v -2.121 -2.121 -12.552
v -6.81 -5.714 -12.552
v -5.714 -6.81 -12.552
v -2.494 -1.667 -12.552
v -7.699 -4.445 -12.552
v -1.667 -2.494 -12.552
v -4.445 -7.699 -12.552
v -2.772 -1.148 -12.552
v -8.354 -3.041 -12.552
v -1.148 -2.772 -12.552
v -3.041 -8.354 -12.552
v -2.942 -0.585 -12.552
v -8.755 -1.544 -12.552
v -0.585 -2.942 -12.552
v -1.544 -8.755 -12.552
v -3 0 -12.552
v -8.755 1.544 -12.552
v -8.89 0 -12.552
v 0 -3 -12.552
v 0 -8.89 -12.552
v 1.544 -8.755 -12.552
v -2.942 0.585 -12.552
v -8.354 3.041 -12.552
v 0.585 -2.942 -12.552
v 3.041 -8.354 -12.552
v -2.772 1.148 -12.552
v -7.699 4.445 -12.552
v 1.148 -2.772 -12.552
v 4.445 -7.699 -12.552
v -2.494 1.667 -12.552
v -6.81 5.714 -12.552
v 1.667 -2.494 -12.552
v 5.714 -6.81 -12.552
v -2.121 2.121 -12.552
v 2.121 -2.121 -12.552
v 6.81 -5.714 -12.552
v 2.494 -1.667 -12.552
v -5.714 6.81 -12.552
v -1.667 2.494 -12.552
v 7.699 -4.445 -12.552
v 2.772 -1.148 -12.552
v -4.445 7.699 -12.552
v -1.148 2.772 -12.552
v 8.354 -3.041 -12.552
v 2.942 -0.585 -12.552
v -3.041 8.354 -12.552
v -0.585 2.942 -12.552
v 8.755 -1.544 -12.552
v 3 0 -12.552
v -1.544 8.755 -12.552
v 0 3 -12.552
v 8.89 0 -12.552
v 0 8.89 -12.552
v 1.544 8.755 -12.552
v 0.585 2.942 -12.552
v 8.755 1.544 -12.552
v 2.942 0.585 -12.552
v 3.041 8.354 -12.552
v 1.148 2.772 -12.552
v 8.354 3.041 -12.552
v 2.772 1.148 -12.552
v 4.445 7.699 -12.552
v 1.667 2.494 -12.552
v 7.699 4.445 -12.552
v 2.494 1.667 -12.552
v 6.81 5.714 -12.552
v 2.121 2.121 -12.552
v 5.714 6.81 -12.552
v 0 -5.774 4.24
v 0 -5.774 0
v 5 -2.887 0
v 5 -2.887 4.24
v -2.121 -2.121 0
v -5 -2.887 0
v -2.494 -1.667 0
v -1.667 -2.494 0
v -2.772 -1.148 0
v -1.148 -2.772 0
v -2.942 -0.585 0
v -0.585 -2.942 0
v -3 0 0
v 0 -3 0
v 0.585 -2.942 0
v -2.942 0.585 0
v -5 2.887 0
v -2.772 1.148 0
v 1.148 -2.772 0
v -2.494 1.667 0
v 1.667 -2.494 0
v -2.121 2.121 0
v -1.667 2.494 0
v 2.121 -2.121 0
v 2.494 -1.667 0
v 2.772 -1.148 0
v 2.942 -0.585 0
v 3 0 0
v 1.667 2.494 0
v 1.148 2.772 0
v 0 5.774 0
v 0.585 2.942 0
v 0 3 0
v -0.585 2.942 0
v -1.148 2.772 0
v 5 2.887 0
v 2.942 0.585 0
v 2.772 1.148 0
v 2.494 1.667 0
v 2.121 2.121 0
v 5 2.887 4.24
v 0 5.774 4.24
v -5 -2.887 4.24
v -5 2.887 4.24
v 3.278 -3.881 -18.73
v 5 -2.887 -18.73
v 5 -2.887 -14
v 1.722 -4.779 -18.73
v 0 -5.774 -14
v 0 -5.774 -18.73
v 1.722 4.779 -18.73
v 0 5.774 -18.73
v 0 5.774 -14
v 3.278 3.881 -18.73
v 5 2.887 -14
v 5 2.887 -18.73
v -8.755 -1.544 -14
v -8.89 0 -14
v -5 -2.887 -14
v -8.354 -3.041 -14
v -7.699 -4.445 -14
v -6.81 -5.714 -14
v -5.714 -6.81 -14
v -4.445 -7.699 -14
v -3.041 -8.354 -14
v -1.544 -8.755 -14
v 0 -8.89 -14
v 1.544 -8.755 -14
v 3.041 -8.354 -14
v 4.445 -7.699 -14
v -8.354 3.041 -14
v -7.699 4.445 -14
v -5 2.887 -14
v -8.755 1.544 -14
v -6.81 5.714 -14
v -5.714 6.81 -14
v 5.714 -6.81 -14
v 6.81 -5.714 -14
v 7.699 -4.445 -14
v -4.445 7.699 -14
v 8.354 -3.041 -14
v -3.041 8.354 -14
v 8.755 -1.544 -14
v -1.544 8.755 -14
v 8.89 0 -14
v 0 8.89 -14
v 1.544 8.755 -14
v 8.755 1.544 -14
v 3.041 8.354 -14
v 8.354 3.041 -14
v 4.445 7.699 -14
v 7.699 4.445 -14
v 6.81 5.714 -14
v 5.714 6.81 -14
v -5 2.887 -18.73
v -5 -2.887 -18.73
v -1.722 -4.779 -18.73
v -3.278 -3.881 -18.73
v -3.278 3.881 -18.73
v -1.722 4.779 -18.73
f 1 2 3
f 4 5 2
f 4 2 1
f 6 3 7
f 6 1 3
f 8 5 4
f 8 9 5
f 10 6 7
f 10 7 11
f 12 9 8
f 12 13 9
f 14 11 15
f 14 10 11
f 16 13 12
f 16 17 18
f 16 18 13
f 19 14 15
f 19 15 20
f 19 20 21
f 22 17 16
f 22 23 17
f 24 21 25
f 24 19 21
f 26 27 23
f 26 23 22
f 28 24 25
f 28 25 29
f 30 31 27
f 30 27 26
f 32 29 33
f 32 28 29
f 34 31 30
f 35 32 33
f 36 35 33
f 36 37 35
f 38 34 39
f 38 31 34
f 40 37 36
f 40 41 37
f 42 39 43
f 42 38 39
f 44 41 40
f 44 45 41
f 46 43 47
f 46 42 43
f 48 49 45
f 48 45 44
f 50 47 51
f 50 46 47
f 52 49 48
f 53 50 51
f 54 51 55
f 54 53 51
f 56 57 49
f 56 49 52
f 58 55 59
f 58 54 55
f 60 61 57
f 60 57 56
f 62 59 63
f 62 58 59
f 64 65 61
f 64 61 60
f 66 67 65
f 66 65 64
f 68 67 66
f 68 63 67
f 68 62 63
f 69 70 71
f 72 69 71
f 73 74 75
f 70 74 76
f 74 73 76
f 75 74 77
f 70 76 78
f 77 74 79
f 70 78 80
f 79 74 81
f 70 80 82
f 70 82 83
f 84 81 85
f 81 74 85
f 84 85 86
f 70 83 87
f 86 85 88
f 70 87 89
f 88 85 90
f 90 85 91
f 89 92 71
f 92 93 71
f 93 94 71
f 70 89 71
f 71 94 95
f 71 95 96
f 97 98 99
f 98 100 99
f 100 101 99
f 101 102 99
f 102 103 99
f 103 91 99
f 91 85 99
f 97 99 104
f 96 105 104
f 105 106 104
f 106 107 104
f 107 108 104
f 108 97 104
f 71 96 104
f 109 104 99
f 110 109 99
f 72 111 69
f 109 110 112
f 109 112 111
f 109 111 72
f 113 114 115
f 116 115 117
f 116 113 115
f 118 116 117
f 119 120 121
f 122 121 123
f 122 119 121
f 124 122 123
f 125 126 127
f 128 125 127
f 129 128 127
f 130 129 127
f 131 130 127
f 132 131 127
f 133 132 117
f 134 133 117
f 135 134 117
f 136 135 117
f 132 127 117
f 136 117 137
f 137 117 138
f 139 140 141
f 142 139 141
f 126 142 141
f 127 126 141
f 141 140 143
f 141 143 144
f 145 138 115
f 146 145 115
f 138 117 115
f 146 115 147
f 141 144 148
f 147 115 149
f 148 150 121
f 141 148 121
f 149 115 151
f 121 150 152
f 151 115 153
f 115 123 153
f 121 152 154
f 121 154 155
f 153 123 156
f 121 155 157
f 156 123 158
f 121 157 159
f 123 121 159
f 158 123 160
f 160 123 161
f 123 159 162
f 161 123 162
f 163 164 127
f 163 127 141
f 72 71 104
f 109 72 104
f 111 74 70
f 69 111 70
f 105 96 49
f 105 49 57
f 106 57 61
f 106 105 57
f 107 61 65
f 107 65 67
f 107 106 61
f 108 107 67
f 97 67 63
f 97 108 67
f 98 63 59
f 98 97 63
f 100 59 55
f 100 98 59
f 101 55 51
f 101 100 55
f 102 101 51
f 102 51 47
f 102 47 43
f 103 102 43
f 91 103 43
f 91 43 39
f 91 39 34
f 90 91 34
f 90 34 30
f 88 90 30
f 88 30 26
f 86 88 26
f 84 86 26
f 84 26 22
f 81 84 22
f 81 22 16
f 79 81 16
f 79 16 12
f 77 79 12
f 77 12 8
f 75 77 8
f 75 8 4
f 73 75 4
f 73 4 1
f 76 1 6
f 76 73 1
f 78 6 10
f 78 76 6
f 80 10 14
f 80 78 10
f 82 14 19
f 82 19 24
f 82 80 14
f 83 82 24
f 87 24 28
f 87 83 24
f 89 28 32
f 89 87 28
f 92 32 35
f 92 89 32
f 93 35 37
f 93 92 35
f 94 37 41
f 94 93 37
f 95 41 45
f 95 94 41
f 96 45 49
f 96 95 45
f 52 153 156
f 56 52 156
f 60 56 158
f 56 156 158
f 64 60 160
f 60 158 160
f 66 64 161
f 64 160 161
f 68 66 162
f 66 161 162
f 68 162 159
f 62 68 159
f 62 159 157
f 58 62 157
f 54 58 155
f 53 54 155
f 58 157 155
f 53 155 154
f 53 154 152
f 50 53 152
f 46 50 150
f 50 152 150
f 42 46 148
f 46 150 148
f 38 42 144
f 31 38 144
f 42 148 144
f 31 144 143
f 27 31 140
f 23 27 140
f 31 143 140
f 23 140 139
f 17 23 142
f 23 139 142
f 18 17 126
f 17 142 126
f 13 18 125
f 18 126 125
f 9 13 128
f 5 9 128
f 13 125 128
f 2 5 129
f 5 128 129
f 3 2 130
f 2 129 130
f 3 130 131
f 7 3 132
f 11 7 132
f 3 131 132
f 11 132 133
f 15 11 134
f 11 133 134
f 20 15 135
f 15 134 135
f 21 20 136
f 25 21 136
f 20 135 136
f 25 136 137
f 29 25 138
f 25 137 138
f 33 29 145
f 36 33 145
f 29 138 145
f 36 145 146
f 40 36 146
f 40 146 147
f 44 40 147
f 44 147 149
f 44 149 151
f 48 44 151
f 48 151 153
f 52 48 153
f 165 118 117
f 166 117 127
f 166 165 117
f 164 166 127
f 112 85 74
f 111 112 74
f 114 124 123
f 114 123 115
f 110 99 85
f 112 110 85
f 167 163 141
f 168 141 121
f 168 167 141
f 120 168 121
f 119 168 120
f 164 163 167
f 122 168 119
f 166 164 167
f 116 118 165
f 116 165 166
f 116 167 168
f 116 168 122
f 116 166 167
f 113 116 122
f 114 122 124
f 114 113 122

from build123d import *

# Parameters (mm, degrees)
F0_R     = 3
F1_DEPTH = 20
F3_DEPTH = 4.24
F5_DEPTH = 6
F6_R     = 8.89
F7_DEPTH = 1.4478
F9_DEPTH = 1.27


with BuildPart() as f1:
    # F0 (on Top) → F1 (new body)
    with BuildSketch(Plane.XY):
        Circle(F0_R)
    extrude(amount=-F1_DEPTH)

    # F2 (on face) → F3 (join)
    with BuildSketch(Plane.XY):
        Polygon((5, 2.8867513459), (0, 5.7735026919), (-5, 2.8867513459), (-5, -2.8867513459), (0, -5.7735026919), (5, -2.8867513459), align=None)
    extrude(amount=F3_DEPTH)

    # F4 (on face) → F5 (join)
    with BuildSketch(Plane(origin=(0, 0, -20), x_dir=(1, 0, 0), z_dir=(0, 0, -1))):
        Polygon((5, 2.8867513459), (0, 5.7735026919), (-5, 2.8867513459), (-5, -2.8867513459), (0, -5.7735026919), (5, -2.8867513459), align=None)
    extrude(amount=-F5_DEPTH)

    # F6 (on face) → F7 (join)
    with BuildSketch(Plane.XY.offset(-14)):
        Circle(F6_R)
    extrude(amount=F7_DEPTH)

    # F8 (on face) → F9 (cut)
    with BuildSketch(Plane(origin=(0, 0, -20), x_dir=(1, 0, 0), z_dir=(0, 0, -1))):
        with BuildLine():
            ThreePointArc((5, -0.8979977728), (5.0599604742, -0.4507771068), (5.08, 0))
            ThreePointArc((5.08, 0), (5.0599604742, 0.4507771068), (5, 0.8979977728))
            Line((5, 0.8979977728), (5, -0.8979977728))
        make_face()
        with BuildLine():
            Line((5, -0.8979977728), (5, 0.8979977728))
            ThreePointArc((5, 0.8979977728), (4.3994090512, 2.54), (3.2776888838, 3.8811281325))
            Line((3.2776888838, 3.8811281325), (1.7223111162, 4.7791259053))
            ThreePointArc((1.7223111162, 4.7791259053), (0, 5.08), (-1.7223111162, 4.7791259053))
            Line((-1.7223111162, 4.7791259053), (-3.2776888838, 3.8811281325))
            ThreePointArc((-3.2776888838, 3.8811281325), (-4.3994090512, 2.54), (-5, 0.8979977728))
            Line((-5, 0.8979977728), (-5, -0.8979977728))
            ThreePointArc((-5, -0.8979977728), (-4.3994090512, -2.54), (-3.2776888838, -3.8811281325))
            Line((-3.2776888838, -3.8811281325), (-1.7223111162, -4.7791259053))
            ThreePointArc((-1.7223111162, -4.7791259053), (0, -5.08), (1.7223111162, -4.7791259053))
            Line((1.7223111162, -4.7791259053), (3.2776888838, -3.8811281325))
            ThreePointArc((3.2776888838, -3.8811281325), (4.3994090512, -2.54), (5, -0.8979977728))
        make_face()
        with BuildLine():
            ThreePointArc((3.2776888838, 3.8811281325), (4.3994090512, 2.54), (5, 0.8979977728))
            Line((5, 0.8979977728), (5, 2.8867513459))
            Line((5, 2.8867513459), (3.2776888838, 3.8811281325))
        make_face()
        with BuildLine():
            Line((5, -2.8867513459), (5, -0.8979977728))
            ThreePointArc((5, -0.8979977728), (4.3994090512, -2.54), (3.2776888838, -3.8811281325))
            Line((3.2776888838, -3.8811281325), (5, -2.8867513459))
        make_face()
        with BuildLine():
            Line((1.7223111162, 4.7791259053), (3.2776888838, 3.8811281325))
            ThreePointArc((3.2776888838, 3.8811281325), (2.54, 4.3994090512), (1.7223111162, 4.7791259053))
        make_face()
        with BuildLine():
            ThreePointArc((1.7223111162, -4.7791259053), (2.54, -4.3994090512), (3.2776888838, -3.8811281325))
            Line((3.2776888838, -3.8811281325), (1.7223111162, -4.7791259053))
        make_face()
        with BuildLine():
            ThreePointArc((-1.7223111162, 4.7791259053), (0, 5.08), (1.7223111162, 4.7791259053))
            Line((1.7223111162, 4.7791259053), (0, 5.7735026919))
            Line((0, 5.7735026919), (-1.7223111162, 4.7791259053))
        make_face()
        with BuildLine():
            Line((0, -5.7735026919), (1.7223111162, -4.7791259053))
            ThreePointArc((1.7223111162, -4.7791259053), (0, -5.08), (-1.7223111162, -4.7791259053))
            Line((-1.7223111162, -4.7791259053), (0, -5.7735026919))
        make_face()
        with BuildLine():
            Line((-3.2776888838, 3.8811281325), (-1.7223111162, 4.7791259053))
            ThreePointArc((-1.7223111162, 4.7791259053), (-2.54, 4.3994090512), (-3.2776888838, 3.8811281325))
        make_face()
        with BuildLine():
            ThreePointArc((-3.2776888838, -3.8811281325), (-2.54, -4.3994090512), (-1.7223111162, -4.7791259053))
            Line((-1.7223111162, -4.7791259053), (-3.2776888838, -3.8811281325))
        make_face()
        with BuildLine():
            ThreePointArc((-5, 0.8979977728), (-4.3994090512, 2.54), (-3.2776888838, 3.8811281325))
            Line((-3.2776888838, 3.8811281325), (-5, 2.8867513459))
            Line((-5, 2.8867513459), (-5, 0.8979977728))
        make_face()
        with BuildLine():
            Line((-5, -2.8867513459), (-3.2776888838, -3.8811281325))
            ThreePointArc((-3.2776888838, -3.8811281325), (-4.3994090512, -2.54), (-5, -0.8979977728))
            Line((-5, -0.8979977728), (-5, -2.8867513459))
        make_face()
        with BuildLine():
            Line((-5, -0.8979977728), (-5, 0.8979977728))
            ThreePointArc((-5, 0.8979977728), (-5.08, 0), (-5, -0.8979977728))
        make_face()
    extrude(amount=-F9_DEPTH, mode=Mode.SUBTRACT)


solid = f1.part
